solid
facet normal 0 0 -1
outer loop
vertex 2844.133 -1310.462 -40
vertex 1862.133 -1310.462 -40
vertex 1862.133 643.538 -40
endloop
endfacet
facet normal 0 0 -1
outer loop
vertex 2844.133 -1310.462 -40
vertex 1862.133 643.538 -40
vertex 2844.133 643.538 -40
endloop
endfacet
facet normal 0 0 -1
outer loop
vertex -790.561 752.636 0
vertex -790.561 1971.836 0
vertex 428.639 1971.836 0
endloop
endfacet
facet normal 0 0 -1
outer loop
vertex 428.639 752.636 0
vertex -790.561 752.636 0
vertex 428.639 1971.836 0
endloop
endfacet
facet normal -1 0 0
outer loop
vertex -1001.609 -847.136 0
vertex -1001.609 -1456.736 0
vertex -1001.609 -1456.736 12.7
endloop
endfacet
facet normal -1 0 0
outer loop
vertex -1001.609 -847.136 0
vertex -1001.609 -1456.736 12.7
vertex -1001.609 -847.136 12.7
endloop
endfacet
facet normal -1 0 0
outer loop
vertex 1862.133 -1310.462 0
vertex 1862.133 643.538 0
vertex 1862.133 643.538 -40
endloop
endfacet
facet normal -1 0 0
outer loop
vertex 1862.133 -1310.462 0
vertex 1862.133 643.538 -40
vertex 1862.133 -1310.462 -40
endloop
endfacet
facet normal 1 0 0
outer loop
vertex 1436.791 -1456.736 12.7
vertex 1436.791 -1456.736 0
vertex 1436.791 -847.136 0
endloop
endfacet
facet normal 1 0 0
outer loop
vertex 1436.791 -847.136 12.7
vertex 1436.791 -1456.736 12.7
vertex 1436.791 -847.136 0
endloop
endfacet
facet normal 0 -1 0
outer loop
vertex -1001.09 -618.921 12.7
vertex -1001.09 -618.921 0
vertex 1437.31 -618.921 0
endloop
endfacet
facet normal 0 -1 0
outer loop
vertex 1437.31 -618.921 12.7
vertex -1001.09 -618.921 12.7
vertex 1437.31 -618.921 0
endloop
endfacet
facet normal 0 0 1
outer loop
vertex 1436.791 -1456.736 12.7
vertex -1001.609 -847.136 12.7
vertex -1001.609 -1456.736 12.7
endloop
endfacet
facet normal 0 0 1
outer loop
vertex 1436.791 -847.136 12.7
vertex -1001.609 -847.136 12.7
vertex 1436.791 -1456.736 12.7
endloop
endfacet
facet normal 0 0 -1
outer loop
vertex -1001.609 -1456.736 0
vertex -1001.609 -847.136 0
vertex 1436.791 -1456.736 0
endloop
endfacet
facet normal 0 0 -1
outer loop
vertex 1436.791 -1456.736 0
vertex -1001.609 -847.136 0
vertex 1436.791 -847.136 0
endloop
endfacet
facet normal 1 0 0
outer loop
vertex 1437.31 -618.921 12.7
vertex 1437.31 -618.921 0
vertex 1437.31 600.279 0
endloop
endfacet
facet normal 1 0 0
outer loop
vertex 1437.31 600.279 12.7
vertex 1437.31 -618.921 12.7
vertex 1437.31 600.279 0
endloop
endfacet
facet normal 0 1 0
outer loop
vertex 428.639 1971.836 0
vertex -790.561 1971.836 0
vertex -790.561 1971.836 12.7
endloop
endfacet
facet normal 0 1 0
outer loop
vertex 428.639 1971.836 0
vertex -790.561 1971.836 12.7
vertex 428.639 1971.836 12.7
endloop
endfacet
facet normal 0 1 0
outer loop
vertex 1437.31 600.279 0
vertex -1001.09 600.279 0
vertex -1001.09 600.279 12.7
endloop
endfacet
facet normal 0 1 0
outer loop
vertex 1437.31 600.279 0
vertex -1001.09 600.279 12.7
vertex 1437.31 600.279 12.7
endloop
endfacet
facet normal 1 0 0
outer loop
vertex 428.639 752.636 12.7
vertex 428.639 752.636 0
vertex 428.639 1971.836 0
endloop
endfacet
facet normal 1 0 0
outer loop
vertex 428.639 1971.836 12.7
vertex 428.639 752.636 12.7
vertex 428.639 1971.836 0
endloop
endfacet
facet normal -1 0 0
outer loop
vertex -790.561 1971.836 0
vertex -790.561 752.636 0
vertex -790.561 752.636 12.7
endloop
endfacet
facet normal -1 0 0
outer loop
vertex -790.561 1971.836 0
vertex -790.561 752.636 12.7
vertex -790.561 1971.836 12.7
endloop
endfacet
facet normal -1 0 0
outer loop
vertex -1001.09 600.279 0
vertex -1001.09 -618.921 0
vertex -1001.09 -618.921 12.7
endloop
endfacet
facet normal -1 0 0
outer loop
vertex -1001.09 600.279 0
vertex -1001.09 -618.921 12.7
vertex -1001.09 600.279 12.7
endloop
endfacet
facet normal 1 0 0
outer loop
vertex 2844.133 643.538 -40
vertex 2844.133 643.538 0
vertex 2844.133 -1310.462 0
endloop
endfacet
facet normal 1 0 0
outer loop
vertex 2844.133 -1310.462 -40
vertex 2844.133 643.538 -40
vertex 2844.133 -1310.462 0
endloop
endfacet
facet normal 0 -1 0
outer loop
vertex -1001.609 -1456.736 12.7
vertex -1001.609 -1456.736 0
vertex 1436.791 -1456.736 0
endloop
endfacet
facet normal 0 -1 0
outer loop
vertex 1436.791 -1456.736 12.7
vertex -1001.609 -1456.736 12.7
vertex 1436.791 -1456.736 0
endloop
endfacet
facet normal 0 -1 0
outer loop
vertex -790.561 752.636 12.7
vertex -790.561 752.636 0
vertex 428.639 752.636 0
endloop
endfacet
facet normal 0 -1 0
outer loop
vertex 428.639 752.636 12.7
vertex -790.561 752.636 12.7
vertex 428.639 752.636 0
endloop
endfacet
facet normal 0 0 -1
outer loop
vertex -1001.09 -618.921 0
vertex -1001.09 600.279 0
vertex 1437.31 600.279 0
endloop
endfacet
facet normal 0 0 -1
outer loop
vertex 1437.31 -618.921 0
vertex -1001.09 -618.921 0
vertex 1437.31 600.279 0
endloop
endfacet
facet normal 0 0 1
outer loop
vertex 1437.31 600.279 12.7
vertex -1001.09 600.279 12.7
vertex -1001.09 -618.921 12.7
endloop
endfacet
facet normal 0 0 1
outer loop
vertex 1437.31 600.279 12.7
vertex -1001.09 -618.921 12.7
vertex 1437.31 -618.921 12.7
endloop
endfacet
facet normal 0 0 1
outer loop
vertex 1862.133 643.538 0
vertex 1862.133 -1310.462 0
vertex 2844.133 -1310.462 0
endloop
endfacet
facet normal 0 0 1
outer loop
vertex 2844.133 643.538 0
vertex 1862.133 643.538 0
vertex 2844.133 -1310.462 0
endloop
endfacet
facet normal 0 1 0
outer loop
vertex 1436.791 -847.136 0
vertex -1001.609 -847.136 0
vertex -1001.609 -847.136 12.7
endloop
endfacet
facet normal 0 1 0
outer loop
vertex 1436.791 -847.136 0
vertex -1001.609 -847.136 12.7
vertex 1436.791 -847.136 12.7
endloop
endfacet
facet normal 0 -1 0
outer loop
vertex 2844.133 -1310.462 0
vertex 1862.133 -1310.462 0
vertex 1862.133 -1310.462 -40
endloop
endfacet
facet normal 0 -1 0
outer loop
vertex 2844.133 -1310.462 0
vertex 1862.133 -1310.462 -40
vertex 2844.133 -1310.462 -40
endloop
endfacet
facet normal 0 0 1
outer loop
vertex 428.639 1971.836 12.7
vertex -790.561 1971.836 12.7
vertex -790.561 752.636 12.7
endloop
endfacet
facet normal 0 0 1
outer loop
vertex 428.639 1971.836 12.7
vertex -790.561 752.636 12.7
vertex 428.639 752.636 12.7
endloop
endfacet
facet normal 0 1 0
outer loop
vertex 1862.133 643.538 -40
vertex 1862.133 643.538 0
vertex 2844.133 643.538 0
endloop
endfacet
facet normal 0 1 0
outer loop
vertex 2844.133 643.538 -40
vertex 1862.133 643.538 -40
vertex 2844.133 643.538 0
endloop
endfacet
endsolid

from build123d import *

# Parameters (mm, degrees)
F0_W     = 2438.4
F0_H     = 1219.2
F0_W_2   = 1219.2
F1_DEPTH = 12.7
F2_W     = 2438.4
F2_H     = 609.6
F3_DEPTH = 12.7
F4_W     = 982
F4_H     = 1954
F5_DEPTH = 40


with BuildPart() as f1:
    # F0 (on Top) → F1 (new body)
    with BuildSketch(Plane.XY):
        with Locations((218.109624, -9.320994)):
            Rectangle(F0_W, F0_H)
        with Locations((-180.961005, 1362.236373)):
            Rectangle(F0_W_2, F0_H)
    extrude(amount=F1_DEPTH)


with BuildPart() as f3:
    # F2 (on Top) → F3 (new body)
    with BuildSketch(Plane.XY):
        with Locations((217.591166, -1151.936)):
            Rectangle(F2_W, F2_H)
    extrude(amount=F3_DEPTH)


with BuildPart() as f5:
    # F4 (on face) → F5 (new body)
    with BuildSketch(Plane(origin=(0, 0, 0), x_dir=(1, 0, 0), z_dir=(0, 0, -1))):
        with Locations((2353.133253, 333.46183)):
            Rectangle(F4_W, F4_H)
    extrude(amount=F5_DEPTH)


solid = Compound([f1.part, f3.part, f5.part])
